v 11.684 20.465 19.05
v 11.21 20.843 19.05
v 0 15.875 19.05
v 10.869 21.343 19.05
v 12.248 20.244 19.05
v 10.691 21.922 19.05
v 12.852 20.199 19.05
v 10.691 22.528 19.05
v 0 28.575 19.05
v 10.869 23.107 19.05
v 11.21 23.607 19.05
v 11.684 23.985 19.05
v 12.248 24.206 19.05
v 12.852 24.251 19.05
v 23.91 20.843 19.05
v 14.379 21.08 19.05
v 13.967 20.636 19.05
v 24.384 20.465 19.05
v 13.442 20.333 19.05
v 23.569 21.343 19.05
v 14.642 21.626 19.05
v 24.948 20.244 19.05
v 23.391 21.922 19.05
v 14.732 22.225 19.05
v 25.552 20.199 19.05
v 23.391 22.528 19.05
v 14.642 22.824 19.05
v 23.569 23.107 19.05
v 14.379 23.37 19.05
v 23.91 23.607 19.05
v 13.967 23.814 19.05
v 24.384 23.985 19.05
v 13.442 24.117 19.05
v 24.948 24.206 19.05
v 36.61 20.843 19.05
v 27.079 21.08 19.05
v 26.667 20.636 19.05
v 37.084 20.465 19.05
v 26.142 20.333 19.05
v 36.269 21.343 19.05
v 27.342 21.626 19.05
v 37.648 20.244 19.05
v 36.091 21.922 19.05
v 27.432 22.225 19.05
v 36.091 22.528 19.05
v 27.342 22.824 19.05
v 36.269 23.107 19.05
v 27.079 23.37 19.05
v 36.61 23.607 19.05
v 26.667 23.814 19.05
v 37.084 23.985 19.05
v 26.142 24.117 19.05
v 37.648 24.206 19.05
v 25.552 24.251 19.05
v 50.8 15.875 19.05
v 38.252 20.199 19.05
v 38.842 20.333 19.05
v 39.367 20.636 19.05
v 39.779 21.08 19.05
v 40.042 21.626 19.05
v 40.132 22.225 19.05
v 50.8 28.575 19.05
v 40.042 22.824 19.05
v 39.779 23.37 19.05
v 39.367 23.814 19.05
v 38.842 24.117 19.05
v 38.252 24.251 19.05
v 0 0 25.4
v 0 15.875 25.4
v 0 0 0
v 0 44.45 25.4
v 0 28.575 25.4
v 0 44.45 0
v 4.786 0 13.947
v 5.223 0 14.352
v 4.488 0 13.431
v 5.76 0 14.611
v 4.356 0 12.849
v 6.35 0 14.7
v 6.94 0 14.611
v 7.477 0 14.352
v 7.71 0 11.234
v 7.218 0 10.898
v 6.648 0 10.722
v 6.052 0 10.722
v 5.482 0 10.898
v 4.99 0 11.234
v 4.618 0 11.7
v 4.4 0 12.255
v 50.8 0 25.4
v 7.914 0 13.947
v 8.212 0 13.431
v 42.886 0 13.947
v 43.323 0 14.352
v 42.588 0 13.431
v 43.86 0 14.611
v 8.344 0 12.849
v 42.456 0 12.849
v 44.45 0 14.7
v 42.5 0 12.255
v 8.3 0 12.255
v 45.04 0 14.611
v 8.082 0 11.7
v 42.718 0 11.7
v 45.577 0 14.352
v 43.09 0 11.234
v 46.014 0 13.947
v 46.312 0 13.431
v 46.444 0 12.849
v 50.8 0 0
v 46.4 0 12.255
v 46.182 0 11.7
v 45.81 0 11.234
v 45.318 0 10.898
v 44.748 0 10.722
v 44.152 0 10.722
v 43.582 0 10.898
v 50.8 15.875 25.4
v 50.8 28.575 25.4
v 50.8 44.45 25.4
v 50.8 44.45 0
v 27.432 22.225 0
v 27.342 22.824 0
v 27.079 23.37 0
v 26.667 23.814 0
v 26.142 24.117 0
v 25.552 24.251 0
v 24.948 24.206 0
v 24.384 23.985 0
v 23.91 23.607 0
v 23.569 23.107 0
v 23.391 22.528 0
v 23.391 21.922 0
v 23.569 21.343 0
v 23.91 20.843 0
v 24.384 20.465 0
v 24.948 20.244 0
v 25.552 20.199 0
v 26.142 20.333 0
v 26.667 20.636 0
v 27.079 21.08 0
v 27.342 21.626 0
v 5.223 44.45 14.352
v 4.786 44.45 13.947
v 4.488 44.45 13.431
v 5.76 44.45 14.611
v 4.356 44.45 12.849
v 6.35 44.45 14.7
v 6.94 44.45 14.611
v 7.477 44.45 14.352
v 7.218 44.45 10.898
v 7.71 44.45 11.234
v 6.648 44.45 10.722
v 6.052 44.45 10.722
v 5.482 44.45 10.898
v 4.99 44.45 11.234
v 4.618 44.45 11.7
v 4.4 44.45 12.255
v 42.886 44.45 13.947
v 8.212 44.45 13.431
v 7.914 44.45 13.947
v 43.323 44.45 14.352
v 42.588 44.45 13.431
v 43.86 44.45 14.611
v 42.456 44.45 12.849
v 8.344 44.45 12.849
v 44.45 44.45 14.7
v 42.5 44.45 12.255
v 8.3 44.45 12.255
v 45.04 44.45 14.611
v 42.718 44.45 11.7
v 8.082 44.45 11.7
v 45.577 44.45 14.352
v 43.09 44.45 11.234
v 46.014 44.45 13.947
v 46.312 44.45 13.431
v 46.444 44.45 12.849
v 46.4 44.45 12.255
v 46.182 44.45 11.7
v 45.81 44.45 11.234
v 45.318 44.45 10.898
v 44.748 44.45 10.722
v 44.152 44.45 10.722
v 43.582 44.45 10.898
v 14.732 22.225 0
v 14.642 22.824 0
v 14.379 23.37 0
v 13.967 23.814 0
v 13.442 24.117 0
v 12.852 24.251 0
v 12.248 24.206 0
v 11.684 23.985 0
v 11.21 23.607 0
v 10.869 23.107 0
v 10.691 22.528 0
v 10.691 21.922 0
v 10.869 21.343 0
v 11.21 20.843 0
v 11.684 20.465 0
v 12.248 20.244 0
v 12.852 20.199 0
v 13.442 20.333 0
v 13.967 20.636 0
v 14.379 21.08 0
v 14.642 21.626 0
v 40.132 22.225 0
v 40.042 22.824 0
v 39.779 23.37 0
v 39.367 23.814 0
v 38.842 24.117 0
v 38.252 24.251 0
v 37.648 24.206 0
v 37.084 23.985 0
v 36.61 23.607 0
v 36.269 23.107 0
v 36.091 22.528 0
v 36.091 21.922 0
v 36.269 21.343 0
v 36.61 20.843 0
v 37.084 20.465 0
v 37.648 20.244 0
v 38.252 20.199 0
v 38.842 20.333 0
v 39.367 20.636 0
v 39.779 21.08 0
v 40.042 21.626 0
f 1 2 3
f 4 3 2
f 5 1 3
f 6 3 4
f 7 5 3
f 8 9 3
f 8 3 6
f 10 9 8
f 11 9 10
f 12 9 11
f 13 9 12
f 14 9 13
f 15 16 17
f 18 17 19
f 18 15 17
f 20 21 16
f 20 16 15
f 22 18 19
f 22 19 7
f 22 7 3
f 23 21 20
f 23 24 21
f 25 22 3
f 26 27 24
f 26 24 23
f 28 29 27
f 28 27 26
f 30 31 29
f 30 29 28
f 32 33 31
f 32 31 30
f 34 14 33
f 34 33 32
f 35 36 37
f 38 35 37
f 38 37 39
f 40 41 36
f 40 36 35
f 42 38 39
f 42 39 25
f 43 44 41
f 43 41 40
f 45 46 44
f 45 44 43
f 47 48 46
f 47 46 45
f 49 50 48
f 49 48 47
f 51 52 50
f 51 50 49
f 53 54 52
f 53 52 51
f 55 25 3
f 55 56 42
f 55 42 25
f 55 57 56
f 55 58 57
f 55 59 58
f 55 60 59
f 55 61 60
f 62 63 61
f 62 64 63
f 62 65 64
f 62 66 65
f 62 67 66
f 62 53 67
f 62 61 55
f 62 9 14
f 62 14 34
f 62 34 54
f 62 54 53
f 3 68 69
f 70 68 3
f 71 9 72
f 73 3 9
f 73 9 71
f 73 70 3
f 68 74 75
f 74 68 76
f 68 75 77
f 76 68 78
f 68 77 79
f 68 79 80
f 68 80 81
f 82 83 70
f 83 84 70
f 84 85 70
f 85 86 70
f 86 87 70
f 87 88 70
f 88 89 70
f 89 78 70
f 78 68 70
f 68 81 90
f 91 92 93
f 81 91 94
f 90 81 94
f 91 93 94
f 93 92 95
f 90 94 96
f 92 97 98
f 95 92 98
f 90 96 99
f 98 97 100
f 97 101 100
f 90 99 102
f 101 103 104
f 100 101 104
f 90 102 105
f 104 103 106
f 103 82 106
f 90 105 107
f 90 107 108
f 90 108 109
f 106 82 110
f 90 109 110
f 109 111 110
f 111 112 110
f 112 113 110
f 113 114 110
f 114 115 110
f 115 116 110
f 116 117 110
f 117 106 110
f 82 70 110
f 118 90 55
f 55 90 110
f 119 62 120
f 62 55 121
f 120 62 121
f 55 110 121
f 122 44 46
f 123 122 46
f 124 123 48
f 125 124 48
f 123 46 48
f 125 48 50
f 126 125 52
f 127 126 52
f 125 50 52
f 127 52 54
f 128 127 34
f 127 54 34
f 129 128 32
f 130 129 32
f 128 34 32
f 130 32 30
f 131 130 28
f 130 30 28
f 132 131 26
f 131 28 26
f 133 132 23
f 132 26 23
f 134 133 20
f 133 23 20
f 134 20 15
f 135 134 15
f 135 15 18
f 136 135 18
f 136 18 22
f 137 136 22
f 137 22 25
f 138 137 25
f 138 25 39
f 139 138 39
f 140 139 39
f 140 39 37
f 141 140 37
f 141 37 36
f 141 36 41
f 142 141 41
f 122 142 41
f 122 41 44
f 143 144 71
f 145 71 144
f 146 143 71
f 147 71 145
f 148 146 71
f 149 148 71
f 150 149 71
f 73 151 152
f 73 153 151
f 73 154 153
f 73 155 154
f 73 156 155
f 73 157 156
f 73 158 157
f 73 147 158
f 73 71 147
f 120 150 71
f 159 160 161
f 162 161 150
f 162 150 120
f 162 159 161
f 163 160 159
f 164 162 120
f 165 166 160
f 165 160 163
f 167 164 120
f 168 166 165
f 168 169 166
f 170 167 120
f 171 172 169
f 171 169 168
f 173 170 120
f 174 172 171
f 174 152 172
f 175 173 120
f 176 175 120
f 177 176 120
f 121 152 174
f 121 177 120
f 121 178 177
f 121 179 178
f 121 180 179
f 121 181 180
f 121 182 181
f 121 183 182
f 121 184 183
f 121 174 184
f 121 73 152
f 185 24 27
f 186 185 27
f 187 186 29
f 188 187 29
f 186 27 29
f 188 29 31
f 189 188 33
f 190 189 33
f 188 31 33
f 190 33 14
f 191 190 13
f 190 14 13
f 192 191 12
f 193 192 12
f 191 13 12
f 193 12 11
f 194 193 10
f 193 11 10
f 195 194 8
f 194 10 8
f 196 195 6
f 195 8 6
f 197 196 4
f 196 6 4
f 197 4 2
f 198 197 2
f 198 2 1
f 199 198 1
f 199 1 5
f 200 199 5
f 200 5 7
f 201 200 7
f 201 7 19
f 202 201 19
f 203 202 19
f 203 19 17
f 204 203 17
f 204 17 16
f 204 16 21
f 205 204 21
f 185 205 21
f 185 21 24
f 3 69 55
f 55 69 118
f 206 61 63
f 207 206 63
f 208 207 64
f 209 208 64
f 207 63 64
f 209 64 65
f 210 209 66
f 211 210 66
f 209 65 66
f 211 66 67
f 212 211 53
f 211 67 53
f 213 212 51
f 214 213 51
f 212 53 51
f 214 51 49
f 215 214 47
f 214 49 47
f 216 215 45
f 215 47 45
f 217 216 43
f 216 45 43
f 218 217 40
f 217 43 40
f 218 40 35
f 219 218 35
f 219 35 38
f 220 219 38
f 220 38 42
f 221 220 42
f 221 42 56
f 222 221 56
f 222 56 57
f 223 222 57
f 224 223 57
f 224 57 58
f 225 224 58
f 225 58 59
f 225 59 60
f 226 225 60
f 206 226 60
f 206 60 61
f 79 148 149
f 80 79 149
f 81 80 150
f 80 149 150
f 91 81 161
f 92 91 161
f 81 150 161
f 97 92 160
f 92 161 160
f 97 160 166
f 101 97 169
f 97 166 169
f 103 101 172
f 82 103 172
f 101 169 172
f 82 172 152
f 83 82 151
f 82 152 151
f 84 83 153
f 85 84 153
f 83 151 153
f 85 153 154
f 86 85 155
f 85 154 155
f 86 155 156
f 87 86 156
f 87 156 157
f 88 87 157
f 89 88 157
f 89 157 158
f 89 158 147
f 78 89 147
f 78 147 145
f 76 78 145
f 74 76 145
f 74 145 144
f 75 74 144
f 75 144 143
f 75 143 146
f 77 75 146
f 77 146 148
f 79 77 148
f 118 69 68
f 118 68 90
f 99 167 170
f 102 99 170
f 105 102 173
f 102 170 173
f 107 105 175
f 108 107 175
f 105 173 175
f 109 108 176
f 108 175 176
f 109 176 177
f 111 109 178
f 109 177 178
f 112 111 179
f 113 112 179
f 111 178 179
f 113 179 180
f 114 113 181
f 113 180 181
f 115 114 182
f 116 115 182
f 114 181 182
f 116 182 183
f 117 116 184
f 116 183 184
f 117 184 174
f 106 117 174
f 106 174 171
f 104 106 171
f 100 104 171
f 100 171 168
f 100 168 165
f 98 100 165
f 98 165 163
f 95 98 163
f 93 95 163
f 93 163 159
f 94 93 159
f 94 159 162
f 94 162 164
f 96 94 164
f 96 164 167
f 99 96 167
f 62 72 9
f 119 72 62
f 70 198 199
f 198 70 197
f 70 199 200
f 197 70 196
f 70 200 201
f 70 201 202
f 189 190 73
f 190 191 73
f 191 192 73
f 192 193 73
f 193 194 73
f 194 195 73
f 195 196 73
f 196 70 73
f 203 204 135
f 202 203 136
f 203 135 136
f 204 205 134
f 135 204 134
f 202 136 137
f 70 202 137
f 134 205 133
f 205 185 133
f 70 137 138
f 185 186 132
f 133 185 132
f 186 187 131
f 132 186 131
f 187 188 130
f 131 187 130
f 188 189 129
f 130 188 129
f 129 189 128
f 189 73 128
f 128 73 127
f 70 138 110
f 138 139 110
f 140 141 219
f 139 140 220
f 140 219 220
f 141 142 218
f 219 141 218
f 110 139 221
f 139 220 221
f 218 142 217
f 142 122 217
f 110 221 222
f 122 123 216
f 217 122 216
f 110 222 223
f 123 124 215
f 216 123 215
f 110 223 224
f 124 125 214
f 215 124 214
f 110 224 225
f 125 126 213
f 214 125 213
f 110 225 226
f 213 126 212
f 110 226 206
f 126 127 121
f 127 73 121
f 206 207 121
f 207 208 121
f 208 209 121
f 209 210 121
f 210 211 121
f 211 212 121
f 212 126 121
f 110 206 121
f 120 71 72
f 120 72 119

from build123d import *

# Parameters (mm, degrees)
SKETCH1_W           = 50.8
SKETCH1_H           = 44.45
BOSS_EXTRUDE1_DEPTH = 25.4
SKETCH4_R           = 2
CUT_EXTRUDE3_DEPTH  = 73.122135992
SKETCH5_W           = 50.8
SKETCH5_H           = 12.7
CUT_EXTRUDE4_DEPTH  = 6.35
SKETCH6_R           = 2.032
CUT_EXTRUDE5_DEPTH  = 71.138042459


with BuildPart() as part:
    # Sketch1 → Boss-Extrude1 (new body)
    with BuildSketch(Plane.XY):
        with Locations((25.4, 22.225)):
            Rectangle(SKETCH1_W, SKETCH1_H)
    extrude(amount=BOSS_EXTRUDE1_DEPTH)

    # Sketch4 → Cut-Extrude3 (cut, through all)
    with BuildSketch(Plane(origin=(0, 44.45, 0), x_dir=(1, 0, 0), z_dir=(0, 1, 0))):
        with Locations(Location((6.35, -12.7, 0), (0, 0, 270))):
            Circle(SKETCH4_R)
        with Locations(Location((44.45, -12.7, 0), (0, 0, 270))):
            Circle(SKETCH4_R)
    extrude(amount=-CUT_EXTRUDE3_DEPTH, mode=Mode.SUBTRACT)

    # Sketch5 → Cut-Extrude4 (cut)
    with BuildSketch(Plane.XY.offset(25.4)):
        with Locations((25.4, 22.225)):
            Rectangle(SKETCH5_W, SKETCH5_H)
    extrude(amount=-CUT_EXTRUDE4_DEPTH, mode=Mode.SUBTRACT)

    # Sketch6 → Cut-Extrude5 (cut, through all)
    with BuildSketch(Plane.XY.offset(19.05)):
        with Locations((25.4, 22.225)):
            Circle(SKETCH6_R)
        with Locations((38.1, 22.225)):
            Circle(SKETCH6_R)
        with Locations((12.7, 22.225)):
            Circle(SKETCH6_R)
    extrude(amount=-CUT_EXTRUDE5_DEPTH, mode=Mode.SUBTRACT)


solid = part.part
